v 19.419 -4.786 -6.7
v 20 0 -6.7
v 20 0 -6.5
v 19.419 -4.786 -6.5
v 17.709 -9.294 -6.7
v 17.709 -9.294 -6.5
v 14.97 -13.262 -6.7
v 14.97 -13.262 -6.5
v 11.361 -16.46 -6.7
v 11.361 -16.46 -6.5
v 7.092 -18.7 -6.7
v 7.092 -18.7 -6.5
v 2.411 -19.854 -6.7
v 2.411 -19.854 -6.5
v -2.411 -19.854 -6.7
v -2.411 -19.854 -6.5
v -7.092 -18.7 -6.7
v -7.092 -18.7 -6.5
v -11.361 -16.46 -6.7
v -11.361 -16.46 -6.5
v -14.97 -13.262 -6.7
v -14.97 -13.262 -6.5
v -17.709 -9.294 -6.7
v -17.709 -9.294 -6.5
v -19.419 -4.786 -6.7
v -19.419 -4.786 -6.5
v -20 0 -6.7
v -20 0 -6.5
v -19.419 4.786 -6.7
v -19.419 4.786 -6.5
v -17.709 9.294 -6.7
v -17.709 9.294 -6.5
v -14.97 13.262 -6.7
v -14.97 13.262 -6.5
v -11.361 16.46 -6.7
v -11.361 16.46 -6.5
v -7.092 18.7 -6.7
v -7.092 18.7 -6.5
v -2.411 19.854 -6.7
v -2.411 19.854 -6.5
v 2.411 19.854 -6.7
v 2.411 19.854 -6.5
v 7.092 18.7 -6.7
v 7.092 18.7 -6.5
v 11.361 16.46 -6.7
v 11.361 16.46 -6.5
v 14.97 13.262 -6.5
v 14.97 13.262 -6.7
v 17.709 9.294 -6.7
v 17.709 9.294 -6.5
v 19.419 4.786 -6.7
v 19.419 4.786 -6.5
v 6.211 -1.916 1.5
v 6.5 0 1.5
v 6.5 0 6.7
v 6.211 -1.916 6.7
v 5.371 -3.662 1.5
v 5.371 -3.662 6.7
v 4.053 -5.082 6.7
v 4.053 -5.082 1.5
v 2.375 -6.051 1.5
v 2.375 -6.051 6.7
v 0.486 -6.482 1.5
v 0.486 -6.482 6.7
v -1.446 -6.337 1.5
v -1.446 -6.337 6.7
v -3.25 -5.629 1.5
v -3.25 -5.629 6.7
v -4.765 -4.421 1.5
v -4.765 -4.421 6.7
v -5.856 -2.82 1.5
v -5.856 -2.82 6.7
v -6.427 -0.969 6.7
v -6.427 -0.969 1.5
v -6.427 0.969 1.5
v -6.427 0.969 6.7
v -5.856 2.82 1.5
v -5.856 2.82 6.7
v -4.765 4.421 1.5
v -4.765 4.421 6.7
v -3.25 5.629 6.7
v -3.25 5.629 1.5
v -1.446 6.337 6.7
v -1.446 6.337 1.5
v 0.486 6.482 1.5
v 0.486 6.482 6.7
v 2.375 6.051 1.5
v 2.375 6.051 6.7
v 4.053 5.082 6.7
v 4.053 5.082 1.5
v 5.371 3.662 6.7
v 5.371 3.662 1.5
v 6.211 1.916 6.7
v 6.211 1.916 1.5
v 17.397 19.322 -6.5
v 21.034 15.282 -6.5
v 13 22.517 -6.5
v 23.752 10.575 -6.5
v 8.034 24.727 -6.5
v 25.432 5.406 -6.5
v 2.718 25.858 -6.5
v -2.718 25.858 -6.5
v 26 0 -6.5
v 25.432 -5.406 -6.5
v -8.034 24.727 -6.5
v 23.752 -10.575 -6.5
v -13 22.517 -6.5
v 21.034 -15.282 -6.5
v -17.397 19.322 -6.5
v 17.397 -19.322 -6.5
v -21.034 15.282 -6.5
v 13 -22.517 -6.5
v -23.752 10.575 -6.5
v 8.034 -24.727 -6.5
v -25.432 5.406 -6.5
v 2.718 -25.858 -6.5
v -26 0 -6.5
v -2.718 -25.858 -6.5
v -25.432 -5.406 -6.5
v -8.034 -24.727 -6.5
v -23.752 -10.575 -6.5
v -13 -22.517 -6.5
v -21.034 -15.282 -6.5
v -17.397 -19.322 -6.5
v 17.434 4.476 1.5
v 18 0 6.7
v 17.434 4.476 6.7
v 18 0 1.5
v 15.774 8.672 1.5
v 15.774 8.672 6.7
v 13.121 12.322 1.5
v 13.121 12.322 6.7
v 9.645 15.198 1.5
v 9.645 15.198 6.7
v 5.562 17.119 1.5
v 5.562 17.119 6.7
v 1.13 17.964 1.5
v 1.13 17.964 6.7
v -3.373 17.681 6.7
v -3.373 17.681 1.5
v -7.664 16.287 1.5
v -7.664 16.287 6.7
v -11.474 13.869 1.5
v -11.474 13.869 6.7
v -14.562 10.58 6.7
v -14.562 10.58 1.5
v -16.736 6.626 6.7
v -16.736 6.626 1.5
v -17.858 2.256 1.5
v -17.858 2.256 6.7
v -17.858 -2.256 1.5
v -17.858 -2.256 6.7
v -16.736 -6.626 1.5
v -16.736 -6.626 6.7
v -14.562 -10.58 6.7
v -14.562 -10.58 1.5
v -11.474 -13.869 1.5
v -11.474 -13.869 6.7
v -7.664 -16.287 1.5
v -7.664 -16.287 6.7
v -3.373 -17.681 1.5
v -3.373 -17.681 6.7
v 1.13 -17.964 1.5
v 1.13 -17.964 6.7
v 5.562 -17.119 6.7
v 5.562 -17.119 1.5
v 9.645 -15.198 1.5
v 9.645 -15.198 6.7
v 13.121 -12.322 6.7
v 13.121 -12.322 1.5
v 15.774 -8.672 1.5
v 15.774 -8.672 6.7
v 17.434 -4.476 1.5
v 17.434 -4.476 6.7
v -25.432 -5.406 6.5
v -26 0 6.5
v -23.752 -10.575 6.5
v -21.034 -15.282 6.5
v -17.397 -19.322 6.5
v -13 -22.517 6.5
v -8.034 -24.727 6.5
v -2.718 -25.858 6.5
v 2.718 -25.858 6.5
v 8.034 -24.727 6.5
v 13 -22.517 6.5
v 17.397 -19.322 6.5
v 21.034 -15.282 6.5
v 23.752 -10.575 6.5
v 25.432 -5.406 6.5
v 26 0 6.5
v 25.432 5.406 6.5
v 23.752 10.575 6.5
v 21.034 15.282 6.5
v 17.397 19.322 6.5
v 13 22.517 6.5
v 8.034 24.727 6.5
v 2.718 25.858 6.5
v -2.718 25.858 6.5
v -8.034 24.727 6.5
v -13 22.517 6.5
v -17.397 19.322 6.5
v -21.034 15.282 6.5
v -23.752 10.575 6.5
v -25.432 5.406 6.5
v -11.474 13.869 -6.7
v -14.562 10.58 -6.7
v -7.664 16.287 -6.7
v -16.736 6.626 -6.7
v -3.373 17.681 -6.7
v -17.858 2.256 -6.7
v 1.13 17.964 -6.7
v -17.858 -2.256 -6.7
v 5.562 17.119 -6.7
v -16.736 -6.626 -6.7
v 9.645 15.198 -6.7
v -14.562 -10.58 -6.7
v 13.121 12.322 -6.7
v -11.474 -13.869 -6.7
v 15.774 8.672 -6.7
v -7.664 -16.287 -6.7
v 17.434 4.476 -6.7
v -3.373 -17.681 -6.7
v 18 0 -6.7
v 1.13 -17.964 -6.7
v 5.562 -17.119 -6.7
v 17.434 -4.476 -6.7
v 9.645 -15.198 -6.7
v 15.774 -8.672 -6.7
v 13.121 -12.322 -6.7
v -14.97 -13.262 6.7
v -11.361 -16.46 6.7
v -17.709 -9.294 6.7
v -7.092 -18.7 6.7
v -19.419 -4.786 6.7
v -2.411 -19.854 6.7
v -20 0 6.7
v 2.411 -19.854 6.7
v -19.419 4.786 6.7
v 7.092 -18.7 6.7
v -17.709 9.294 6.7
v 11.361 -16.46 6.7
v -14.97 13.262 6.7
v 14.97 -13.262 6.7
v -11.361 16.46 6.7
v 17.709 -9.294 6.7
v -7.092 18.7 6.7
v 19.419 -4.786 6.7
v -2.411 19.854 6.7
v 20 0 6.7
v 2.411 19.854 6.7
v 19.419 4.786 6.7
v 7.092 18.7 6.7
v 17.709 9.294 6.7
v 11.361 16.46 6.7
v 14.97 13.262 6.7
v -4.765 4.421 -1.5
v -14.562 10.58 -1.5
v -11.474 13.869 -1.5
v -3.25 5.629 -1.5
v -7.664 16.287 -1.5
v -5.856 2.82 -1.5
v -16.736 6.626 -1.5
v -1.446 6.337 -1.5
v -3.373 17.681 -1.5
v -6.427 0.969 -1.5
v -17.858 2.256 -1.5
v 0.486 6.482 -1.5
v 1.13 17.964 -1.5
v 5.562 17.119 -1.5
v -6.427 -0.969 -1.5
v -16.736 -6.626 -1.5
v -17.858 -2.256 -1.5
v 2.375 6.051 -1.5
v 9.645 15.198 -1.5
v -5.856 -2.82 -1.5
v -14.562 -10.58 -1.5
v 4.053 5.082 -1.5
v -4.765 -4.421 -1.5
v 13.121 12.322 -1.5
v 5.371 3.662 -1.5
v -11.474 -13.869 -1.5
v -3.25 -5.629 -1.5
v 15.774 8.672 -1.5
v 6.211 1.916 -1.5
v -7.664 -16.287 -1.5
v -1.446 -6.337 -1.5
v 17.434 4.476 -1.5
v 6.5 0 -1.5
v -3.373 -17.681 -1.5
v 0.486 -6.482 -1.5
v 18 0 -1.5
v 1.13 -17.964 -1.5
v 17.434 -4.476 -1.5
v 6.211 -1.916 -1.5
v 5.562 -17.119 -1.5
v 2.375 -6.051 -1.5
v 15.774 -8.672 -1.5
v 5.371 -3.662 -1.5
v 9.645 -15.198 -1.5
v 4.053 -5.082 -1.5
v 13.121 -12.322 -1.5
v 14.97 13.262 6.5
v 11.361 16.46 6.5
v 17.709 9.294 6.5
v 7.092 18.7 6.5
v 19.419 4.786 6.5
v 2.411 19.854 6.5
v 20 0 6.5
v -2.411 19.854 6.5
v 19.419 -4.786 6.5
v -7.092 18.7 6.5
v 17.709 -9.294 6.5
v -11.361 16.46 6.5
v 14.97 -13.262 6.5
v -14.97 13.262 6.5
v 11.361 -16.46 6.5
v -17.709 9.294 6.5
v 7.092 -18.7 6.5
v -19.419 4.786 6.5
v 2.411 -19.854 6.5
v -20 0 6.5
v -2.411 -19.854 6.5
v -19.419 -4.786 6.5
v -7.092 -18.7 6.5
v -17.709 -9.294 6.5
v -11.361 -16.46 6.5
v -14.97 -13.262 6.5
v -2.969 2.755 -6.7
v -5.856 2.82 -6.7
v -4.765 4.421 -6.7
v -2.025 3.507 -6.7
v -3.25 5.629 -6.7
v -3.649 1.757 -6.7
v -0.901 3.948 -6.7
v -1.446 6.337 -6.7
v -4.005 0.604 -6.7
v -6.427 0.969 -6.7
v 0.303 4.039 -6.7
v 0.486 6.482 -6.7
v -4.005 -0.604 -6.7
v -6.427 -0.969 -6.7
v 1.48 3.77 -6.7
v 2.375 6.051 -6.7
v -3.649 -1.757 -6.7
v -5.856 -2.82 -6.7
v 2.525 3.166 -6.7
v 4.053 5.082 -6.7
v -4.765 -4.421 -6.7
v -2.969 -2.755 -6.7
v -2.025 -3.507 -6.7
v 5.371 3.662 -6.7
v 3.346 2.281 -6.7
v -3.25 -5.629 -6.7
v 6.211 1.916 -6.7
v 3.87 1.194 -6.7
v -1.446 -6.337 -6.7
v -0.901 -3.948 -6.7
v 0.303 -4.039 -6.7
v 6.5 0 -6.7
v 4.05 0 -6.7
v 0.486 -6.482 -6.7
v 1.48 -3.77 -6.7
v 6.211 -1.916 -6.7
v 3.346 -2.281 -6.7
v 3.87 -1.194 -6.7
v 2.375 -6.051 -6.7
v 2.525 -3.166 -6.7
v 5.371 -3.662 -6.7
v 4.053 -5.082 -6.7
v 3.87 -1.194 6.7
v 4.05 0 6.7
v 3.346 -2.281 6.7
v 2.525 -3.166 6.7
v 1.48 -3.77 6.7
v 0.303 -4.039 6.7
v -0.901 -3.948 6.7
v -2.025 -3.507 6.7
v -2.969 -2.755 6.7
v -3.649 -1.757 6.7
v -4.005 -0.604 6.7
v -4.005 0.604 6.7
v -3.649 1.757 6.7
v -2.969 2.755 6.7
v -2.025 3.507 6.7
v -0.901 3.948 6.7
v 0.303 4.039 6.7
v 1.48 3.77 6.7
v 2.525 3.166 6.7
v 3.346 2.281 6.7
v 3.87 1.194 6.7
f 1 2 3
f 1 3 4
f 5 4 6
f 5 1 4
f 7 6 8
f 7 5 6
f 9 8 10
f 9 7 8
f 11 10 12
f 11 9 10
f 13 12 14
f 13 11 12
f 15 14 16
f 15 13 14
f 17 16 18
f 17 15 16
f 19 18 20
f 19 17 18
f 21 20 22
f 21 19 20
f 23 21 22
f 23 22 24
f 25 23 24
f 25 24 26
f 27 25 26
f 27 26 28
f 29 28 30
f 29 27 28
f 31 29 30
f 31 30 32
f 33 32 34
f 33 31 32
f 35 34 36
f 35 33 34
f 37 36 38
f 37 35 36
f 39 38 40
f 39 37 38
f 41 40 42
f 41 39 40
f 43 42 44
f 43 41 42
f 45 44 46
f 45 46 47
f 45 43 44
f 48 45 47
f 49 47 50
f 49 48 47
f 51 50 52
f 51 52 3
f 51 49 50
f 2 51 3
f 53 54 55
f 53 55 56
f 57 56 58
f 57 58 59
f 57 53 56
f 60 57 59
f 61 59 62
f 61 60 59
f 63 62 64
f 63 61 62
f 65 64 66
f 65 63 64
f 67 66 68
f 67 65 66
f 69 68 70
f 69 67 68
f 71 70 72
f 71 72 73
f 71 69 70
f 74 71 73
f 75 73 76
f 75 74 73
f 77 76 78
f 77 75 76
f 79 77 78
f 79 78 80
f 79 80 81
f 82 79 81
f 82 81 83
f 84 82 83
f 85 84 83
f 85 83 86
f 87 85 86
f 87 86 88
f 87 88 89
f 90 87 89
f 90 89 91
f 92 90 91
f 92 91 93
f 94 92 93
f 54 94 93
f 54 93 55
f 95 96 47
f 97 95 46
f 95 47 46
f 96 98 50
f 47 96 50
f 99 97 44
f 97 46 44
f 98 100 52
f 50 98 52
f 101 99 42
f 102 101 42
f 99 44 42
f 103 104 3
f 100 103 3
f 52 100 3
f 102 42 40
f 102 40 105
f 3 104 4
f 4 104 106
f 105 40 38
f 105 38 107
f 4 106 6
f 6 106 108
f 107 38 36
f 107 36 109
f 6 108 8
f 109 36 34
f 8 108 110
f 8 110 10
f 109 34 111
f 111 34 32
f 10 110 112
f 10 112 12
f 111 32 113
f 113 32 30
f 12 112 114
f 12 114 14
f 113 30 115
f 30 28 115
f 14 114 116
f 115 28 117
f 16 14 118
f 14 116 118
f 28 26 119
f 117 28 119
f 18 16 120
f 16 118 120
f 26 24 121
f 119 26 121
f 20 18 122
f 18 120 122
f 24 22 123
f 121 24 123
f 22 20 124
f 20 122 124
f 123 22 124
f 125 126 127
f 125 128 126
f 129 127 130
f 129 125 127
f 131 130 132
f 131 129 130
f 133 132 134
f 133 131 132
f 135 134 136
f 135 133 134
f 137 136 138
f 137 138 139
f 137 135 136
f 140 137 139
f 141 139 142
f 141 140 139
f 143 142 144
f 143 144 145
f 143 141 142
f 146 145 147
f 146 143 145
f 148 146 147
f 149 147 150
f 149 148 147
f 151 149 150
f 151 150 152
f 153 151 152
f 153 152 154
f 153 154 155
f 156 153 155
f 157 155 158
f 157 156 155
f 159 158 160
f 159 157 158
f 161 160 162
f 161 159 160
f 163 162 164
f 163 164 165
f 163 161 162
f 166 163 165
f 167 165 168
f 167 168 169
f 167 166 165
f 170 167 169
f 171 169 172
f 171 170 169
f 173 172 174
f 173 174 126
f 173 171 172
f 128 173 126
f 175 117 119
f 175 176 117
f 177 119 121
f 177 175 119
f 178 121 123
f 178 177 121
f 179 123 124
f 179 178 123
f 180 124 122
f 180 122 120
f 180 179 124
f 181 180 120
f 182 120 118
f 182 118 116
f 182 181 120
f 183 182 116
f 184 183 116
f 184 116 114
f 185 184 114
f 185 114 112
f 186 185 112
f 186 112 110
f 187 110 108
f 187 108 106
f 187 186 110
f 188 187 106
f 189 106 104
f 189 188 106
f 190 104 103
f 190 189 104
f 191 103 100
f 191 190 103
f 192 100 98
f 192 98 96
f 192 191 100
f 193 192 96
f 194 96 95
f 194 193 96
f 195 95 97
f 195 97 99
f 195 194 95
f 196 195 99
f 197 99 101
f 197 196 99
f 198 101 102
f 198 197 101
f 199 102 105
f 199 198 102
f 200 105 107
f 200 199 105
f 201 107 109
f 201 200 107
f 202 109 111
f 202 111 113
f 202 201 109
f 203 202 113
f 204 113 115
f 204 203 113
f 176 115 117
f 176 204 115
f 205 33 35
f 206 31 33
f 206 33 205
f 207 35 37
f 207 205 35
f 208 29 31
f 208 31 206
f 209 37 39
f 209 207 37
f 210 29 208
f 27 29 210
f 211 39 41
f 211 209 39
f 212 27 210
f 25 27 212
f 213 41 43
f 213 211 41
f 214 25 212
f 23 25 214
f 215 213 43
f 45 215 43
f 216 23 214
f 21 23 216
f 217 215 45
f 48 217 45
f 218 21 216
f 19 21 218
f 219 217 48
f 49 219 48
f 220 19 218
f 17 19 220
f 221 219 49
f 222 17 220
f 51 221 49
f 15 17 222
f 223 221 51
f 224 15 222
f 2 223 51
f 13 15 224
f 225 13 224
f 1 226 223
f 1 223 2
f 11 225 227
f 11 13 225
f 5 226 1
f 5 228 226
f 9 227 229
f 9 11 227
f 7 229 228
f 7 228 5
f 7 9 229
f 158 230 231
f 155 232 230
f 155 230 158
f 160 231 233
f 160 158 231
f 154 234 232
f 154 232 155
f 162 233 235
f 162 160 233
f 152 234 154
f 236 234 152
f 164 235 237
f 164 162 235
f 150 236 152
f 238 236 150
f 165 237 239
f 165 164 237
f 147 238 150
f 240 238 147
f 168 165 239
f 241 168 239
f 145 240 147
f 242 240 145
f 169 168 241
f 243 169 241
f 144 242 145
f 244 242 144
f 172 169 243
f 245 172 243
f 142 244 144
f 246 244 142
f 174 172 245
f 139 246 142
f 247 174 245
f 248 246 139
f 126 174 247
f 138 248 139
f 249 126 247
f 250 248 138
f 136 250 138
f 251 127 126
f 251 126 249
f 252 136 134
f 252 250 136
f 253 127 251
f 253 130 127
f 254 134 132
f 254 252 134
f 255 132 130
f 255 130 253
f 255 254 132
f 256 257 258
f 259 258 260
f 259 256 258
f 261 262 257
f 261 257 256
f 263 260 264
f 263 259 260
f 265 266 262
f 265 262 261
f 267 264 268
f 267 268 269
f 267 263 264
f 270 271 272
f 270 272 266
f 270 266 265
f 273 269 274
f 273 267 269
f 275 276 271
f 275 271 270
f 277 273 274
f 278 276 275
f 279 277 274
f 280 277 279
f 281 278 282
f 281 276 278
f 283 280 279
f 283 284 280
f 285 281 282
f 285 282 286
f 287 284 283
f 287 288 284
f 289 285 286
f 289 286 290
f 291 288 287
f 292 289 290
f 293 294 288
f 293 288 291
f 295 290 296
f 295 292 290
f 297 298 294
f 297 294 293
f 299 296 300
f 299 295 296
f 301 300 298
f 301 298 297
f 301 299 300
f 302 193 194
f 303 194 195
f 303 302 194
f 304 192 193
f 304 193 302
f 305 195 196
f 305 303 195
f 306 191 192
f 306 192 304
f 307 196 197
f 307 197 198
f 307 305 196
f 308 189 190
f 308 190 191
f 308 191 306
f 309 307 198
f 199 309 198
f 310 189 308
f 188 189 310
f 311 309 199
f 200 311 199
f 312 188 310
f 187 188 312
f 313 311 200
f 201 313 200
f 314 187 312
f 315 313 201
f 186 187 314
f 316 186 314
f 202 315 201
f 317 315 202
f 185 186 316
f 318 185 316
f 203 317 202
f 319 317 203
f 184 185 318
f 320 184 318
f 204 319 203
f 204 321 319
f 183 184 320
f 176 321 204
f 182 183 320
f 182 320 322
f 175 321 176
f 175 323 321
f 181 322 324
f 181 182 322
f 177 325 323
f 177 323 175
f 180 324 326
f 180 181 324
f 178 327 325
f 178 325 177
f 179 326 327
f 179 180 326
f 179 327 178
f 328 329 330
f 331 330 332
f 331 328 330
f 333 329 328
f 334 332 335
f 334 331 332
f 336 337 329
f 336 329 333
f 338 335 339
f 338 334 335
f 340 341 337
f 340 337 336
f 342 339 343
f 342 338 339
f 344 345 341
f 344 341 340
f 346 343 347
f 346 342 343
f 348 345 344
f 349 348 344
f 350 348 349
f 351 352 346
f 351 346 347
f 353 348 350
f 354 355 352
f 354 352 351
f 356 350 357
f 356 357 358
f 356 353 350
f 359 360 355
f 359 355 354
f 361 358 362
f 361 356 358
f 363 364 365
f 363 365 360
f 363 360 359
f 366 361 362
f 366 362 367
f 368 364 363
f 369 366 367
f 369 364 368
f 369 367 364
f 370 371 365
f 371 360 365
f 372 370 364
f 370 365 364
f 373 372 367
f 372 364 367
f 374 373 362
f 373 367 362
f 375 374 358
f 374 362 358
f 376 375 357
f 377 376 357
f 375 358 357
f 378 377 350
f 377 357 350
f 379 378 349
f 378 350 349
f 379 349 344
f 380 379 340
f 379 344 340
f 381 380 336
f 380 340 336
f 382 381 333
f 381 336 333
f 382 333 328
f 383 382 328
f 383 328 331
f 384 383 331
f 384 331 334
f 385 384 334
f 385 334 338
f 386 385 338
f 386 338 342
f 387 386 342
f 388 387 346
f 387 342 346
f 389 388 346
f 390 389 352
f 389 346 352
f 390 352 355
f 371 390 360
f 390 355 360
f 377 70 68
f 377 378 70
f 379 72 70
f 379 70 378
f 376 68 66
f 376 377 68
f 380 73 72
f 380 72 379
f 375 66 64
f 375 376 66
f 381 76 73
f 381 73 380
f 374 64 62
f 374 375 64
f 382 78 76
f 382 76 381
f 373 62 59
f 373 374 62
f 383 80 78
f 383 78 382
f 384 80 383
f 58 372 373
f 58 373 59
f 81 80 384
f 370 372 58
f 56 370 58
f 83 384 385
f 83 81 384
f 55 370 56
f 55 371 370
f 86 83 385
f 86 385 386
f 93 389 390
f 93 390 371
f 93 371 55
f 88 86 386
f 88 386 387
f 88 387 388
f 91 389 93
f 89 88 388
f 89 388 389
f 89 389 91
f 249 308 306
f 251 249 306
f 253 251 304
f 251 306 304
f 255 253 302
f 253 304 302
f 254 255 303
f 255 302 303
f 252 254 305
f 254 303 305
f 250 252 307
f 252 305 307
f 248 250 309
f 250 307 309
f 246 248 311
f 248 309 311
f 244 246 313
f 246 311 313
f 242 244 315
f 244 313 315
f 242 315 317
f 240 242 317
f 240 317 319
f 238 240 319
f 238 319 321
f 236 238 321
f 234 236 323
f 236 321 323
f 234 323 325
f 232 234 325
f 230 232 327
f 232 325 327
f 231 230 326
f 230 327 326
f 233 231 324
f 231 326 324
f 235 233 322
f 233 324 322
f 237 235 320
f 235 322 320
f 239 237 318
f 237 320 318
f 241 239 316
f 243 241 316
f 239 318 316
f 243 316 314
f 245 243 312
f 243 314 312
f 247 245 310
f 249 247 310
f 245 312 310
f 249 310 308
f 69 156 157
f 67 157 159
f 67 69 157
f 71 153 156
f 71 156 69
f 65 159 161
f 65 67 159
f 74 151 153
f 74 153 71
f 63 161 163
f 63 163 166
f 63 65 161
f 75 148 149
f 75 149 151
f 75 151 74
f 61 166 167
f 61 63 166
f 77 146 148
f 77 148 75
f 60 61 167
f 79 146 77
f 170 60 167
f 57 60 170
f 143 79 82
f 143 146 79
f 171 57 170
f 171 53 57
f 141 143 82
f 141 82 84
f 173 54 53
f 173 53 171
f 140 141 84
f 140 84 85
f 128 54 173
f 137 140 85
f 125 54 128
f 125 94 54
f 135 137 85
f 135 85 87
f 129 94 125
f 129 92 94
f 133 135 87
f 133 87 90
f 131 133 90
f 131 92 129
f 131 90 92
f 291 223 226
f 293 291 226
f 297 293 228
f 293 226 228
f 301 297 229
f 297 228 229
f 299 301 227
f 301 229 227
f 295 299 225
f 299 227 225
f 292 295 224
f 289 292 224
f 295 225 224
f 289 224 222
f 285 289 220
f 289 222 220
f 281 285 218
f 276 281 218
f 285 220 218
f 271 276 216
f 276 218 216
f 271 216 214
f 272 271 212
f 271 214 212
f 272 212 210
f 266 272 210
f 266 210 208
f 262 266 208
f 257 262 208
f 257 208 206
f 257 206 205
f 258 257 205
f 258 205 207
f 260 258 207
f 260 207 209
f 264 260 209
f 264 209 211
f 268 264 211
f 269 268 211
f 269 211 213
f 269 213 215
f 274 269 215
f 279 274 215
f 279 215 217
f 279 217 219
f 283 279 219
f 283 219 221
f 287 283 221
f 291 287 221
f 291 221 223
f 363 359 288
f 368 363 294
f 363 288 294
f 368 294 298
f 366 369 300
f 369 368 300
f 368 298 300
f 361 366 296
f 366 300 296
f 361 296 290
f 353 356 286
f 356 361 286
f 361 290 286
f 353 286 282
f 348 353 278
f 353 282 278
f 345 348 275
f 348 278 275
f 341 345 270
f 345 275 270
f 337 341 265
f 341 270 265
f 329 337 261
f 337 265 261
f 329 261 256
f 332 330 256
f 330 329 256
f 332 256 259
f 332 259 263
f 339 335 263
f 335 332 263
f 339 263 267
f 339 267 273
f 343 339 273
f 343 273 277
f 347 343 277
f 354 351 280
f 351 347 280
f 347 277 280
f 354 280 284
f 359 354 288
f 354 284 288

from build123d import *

# Parameters (mm, degrees)
CROQUIS1_R                          = 26
SALIENTE_EXTRUIR1_DEPTH             = 6.5
CROQUIS2_R                          = 20
CROQUIS2_R_2                        = 18
SALIENTE_EXTRUIR3_DEPTH             = 0.2
SALIENTE_EXTRUIR4_START             = 0.2
CROQUIS4_R                          = 20
CROQUIS4_R_2                        = 18
SALIENTE_EXTRUIR4_DEPTH             = 0.2
CROQUIS5_R                          = 18
CORTAR_EXTRUIR1_DEPTH               = 5
CORTAR_EXTRUIR2_START               = -5
CROQUIS6_R                          = 18
CORTAR_EXTRUIR2_DEPTH               = 5
SALIENTE_EXTRUIR5_REACH             = 39.673
CROQUIS7_R                          = 6.5
CROQUIS7_R_2                        = 4.05
SALIENTE_EXTRUIR5_DIRECTION_2_REACH = 39.673
CROQUIS8_R                          = 4.05
CORTAR_EXTRUIR3_DEPTH               = 39


with BuildPart() as part:
    # Croquis1 → Saliente-Extruir1 (new, symmetric)
    with BuildSketch(Plane.XY):
        with Locations(Location((0, 0, 0), (0, 0, 180))):
            Circle(CROQUIS1_R)
    extrude(amount=SALIENTE_EXTRUIR1_DEPTH, both=True)

    # Croquis2 → Saliente-Extruir3 (add)
    with BuildSketch(Plane.XY.offset(6.5)):
        Circle(CROQUIS2_R)
        Circle(CROQUIS2_R_2, mode=Mode.SUBTRACT)
    extrude(amount=SALIENTE_EXTRUIR3_DEPTH)

    # Croquis4 → Saliente-Extruir4 (add)
    with BuildSketch(Plane(origin=(0, 0, -6.5), x_dir=(-1, 0, 0), z_dir=(0, 0, -1)).offset(SALIENTE_EXTRUIR4_START)):
        with Locations(Location((0, 0, 0), (0, 0, 180))):
            Circle(CROQUIS4_R)
        with Locations(Location((0, 0, 0), (0, 0, 180))):
            Circle(CROQUIS4_R_2, mode=Mode.SUBTRACT)
    extrude(amount=-SALIENTE_EXTRUIR4_DEPTH)

    # Croquis5 → Cortar-Extruir1 (cut)
    with BuildSketch(Plane(origin=(0, 0, -6.5), x_dir=(-1, 0, 0), z_dir=(0, 0, -1))):
        with Locations(Location((0, 0, 0), (0, 0, 180))):
            Circle(CROQUIS5_R)
    extrude(amount=-CORTAR_EXTRUIR1_DEPTH, mode=Mode.SUBTRACT)

    # Croquis6 → Cortar-Extruir2 (cut)
    with BuildSketch(Plane.XY.offset(6.5).offset(CORTAR_EXTRUIR2_START)):
        Circle(CROQUIS6_R)
    extrude(amount=CORTAR_EXTRUIR2_DEPTH, mode=Mode.SUBTRACT)

    # Saliente-Extruir5: up to this face of the body (flat: up to its plane)
    saliente_extruir5_end = Plane(part.part.faces().sort_by_distance((-19.434314575, 0, -6.7))[0])
    # Croquis7 → Saliente-Extruir5 (add, up to the picked face)
    with BuildSketch(Plane(origin=(0, 0, -1.5), x_dir=(-1, 0, 0), z_dir=(0, 0, -1)), mode=Mode.PRIVATE) as saliente_extruir5_sk1:
        with Locations(Location((0, 0, 0), (0, 0, 180))):
            Circle(CROQUIS7_R)
        with Locations(Location((0, 0, 0), (0, 0, 180))):
            Circle(CROQUIS7_R_2, mode=Mode.SUBTRACT)
    saliente_extruir5_tool1 = split(extrude(saliente_extruir5_sk1.sketch, amount=SALIENTE_EXTRUIR5_REACH, mode=Mode.PRIVATE), bisect_by=saliente_extruir5_end, keep=Keep.BOTH, mode=Mode.PRIVATE)
    add(saliente_extruir5_tool1.solids().sort_by(Axis((-6.316152, 0, -1.5), (0, 0, -1)))[0])

    # Saliente-Extruir5 direction 2: up to this face of the body (flat: up to its plane)
    saliente_extruir5_direction_2_end = Plane(part.part.faces().sort_by_distance((-19.434314575, 0, 6.7))[0])
    # Croquis7 → Saliente-Extruir5 direction 2 (add, up to the picked face)
    with BuildSketch(Plane(origin=(0, 0, -1.5), x_dir=(-1, 0, 0), z_dir=(0, 0, -1)), mode=Mode.PRIVATE) as saliente_extruir5_direction_2_sk1:
        with Locations(Location((0, 0, 0), (0, 0, 180))):
            Circle(CROQUIS7_R)
        with Locations(Location((0, 0, 0), (0, 0, 180))):
            Circle(CROQUIS7_R_2, mode=Mode.SUBTRACT)
    saliente_extruir5_direction_2_tool1 = split(extrude(saliente_extruir5_direction_2_sk1.sketch, amount=-SALIENTE_EXTRUIR5_DIRECTION_2_REACH, mode=Mode.PRIVATE), bisect_by=saliente_extruir5_direction_2_end, keep=Keep.BOTH, mode=Mode.PRIVATE)
    add(saliente_extruir5_direction_2_tool1.solids().sort_by(Axis((-6.316152, 0, -1.5), (0, 0, 1)))[0])

    # Croquis8 → Cortar-Extruir3 (cut, symmetric)
    with BuildSketch(Plane(origin=(0, 0, -1.5), x_dir=(-1, 0, 0), z_dir=(0, 0, -1))):
        with Locations(Location((0, 0, 0), (0, 0, 180))):
            Circle(CROQUIS8_R)
    extrude(amount=CORTAR_EXTRUIR3_DEPTH, both=True, mode=Mode.SUBTRACT)


solid = part.part
